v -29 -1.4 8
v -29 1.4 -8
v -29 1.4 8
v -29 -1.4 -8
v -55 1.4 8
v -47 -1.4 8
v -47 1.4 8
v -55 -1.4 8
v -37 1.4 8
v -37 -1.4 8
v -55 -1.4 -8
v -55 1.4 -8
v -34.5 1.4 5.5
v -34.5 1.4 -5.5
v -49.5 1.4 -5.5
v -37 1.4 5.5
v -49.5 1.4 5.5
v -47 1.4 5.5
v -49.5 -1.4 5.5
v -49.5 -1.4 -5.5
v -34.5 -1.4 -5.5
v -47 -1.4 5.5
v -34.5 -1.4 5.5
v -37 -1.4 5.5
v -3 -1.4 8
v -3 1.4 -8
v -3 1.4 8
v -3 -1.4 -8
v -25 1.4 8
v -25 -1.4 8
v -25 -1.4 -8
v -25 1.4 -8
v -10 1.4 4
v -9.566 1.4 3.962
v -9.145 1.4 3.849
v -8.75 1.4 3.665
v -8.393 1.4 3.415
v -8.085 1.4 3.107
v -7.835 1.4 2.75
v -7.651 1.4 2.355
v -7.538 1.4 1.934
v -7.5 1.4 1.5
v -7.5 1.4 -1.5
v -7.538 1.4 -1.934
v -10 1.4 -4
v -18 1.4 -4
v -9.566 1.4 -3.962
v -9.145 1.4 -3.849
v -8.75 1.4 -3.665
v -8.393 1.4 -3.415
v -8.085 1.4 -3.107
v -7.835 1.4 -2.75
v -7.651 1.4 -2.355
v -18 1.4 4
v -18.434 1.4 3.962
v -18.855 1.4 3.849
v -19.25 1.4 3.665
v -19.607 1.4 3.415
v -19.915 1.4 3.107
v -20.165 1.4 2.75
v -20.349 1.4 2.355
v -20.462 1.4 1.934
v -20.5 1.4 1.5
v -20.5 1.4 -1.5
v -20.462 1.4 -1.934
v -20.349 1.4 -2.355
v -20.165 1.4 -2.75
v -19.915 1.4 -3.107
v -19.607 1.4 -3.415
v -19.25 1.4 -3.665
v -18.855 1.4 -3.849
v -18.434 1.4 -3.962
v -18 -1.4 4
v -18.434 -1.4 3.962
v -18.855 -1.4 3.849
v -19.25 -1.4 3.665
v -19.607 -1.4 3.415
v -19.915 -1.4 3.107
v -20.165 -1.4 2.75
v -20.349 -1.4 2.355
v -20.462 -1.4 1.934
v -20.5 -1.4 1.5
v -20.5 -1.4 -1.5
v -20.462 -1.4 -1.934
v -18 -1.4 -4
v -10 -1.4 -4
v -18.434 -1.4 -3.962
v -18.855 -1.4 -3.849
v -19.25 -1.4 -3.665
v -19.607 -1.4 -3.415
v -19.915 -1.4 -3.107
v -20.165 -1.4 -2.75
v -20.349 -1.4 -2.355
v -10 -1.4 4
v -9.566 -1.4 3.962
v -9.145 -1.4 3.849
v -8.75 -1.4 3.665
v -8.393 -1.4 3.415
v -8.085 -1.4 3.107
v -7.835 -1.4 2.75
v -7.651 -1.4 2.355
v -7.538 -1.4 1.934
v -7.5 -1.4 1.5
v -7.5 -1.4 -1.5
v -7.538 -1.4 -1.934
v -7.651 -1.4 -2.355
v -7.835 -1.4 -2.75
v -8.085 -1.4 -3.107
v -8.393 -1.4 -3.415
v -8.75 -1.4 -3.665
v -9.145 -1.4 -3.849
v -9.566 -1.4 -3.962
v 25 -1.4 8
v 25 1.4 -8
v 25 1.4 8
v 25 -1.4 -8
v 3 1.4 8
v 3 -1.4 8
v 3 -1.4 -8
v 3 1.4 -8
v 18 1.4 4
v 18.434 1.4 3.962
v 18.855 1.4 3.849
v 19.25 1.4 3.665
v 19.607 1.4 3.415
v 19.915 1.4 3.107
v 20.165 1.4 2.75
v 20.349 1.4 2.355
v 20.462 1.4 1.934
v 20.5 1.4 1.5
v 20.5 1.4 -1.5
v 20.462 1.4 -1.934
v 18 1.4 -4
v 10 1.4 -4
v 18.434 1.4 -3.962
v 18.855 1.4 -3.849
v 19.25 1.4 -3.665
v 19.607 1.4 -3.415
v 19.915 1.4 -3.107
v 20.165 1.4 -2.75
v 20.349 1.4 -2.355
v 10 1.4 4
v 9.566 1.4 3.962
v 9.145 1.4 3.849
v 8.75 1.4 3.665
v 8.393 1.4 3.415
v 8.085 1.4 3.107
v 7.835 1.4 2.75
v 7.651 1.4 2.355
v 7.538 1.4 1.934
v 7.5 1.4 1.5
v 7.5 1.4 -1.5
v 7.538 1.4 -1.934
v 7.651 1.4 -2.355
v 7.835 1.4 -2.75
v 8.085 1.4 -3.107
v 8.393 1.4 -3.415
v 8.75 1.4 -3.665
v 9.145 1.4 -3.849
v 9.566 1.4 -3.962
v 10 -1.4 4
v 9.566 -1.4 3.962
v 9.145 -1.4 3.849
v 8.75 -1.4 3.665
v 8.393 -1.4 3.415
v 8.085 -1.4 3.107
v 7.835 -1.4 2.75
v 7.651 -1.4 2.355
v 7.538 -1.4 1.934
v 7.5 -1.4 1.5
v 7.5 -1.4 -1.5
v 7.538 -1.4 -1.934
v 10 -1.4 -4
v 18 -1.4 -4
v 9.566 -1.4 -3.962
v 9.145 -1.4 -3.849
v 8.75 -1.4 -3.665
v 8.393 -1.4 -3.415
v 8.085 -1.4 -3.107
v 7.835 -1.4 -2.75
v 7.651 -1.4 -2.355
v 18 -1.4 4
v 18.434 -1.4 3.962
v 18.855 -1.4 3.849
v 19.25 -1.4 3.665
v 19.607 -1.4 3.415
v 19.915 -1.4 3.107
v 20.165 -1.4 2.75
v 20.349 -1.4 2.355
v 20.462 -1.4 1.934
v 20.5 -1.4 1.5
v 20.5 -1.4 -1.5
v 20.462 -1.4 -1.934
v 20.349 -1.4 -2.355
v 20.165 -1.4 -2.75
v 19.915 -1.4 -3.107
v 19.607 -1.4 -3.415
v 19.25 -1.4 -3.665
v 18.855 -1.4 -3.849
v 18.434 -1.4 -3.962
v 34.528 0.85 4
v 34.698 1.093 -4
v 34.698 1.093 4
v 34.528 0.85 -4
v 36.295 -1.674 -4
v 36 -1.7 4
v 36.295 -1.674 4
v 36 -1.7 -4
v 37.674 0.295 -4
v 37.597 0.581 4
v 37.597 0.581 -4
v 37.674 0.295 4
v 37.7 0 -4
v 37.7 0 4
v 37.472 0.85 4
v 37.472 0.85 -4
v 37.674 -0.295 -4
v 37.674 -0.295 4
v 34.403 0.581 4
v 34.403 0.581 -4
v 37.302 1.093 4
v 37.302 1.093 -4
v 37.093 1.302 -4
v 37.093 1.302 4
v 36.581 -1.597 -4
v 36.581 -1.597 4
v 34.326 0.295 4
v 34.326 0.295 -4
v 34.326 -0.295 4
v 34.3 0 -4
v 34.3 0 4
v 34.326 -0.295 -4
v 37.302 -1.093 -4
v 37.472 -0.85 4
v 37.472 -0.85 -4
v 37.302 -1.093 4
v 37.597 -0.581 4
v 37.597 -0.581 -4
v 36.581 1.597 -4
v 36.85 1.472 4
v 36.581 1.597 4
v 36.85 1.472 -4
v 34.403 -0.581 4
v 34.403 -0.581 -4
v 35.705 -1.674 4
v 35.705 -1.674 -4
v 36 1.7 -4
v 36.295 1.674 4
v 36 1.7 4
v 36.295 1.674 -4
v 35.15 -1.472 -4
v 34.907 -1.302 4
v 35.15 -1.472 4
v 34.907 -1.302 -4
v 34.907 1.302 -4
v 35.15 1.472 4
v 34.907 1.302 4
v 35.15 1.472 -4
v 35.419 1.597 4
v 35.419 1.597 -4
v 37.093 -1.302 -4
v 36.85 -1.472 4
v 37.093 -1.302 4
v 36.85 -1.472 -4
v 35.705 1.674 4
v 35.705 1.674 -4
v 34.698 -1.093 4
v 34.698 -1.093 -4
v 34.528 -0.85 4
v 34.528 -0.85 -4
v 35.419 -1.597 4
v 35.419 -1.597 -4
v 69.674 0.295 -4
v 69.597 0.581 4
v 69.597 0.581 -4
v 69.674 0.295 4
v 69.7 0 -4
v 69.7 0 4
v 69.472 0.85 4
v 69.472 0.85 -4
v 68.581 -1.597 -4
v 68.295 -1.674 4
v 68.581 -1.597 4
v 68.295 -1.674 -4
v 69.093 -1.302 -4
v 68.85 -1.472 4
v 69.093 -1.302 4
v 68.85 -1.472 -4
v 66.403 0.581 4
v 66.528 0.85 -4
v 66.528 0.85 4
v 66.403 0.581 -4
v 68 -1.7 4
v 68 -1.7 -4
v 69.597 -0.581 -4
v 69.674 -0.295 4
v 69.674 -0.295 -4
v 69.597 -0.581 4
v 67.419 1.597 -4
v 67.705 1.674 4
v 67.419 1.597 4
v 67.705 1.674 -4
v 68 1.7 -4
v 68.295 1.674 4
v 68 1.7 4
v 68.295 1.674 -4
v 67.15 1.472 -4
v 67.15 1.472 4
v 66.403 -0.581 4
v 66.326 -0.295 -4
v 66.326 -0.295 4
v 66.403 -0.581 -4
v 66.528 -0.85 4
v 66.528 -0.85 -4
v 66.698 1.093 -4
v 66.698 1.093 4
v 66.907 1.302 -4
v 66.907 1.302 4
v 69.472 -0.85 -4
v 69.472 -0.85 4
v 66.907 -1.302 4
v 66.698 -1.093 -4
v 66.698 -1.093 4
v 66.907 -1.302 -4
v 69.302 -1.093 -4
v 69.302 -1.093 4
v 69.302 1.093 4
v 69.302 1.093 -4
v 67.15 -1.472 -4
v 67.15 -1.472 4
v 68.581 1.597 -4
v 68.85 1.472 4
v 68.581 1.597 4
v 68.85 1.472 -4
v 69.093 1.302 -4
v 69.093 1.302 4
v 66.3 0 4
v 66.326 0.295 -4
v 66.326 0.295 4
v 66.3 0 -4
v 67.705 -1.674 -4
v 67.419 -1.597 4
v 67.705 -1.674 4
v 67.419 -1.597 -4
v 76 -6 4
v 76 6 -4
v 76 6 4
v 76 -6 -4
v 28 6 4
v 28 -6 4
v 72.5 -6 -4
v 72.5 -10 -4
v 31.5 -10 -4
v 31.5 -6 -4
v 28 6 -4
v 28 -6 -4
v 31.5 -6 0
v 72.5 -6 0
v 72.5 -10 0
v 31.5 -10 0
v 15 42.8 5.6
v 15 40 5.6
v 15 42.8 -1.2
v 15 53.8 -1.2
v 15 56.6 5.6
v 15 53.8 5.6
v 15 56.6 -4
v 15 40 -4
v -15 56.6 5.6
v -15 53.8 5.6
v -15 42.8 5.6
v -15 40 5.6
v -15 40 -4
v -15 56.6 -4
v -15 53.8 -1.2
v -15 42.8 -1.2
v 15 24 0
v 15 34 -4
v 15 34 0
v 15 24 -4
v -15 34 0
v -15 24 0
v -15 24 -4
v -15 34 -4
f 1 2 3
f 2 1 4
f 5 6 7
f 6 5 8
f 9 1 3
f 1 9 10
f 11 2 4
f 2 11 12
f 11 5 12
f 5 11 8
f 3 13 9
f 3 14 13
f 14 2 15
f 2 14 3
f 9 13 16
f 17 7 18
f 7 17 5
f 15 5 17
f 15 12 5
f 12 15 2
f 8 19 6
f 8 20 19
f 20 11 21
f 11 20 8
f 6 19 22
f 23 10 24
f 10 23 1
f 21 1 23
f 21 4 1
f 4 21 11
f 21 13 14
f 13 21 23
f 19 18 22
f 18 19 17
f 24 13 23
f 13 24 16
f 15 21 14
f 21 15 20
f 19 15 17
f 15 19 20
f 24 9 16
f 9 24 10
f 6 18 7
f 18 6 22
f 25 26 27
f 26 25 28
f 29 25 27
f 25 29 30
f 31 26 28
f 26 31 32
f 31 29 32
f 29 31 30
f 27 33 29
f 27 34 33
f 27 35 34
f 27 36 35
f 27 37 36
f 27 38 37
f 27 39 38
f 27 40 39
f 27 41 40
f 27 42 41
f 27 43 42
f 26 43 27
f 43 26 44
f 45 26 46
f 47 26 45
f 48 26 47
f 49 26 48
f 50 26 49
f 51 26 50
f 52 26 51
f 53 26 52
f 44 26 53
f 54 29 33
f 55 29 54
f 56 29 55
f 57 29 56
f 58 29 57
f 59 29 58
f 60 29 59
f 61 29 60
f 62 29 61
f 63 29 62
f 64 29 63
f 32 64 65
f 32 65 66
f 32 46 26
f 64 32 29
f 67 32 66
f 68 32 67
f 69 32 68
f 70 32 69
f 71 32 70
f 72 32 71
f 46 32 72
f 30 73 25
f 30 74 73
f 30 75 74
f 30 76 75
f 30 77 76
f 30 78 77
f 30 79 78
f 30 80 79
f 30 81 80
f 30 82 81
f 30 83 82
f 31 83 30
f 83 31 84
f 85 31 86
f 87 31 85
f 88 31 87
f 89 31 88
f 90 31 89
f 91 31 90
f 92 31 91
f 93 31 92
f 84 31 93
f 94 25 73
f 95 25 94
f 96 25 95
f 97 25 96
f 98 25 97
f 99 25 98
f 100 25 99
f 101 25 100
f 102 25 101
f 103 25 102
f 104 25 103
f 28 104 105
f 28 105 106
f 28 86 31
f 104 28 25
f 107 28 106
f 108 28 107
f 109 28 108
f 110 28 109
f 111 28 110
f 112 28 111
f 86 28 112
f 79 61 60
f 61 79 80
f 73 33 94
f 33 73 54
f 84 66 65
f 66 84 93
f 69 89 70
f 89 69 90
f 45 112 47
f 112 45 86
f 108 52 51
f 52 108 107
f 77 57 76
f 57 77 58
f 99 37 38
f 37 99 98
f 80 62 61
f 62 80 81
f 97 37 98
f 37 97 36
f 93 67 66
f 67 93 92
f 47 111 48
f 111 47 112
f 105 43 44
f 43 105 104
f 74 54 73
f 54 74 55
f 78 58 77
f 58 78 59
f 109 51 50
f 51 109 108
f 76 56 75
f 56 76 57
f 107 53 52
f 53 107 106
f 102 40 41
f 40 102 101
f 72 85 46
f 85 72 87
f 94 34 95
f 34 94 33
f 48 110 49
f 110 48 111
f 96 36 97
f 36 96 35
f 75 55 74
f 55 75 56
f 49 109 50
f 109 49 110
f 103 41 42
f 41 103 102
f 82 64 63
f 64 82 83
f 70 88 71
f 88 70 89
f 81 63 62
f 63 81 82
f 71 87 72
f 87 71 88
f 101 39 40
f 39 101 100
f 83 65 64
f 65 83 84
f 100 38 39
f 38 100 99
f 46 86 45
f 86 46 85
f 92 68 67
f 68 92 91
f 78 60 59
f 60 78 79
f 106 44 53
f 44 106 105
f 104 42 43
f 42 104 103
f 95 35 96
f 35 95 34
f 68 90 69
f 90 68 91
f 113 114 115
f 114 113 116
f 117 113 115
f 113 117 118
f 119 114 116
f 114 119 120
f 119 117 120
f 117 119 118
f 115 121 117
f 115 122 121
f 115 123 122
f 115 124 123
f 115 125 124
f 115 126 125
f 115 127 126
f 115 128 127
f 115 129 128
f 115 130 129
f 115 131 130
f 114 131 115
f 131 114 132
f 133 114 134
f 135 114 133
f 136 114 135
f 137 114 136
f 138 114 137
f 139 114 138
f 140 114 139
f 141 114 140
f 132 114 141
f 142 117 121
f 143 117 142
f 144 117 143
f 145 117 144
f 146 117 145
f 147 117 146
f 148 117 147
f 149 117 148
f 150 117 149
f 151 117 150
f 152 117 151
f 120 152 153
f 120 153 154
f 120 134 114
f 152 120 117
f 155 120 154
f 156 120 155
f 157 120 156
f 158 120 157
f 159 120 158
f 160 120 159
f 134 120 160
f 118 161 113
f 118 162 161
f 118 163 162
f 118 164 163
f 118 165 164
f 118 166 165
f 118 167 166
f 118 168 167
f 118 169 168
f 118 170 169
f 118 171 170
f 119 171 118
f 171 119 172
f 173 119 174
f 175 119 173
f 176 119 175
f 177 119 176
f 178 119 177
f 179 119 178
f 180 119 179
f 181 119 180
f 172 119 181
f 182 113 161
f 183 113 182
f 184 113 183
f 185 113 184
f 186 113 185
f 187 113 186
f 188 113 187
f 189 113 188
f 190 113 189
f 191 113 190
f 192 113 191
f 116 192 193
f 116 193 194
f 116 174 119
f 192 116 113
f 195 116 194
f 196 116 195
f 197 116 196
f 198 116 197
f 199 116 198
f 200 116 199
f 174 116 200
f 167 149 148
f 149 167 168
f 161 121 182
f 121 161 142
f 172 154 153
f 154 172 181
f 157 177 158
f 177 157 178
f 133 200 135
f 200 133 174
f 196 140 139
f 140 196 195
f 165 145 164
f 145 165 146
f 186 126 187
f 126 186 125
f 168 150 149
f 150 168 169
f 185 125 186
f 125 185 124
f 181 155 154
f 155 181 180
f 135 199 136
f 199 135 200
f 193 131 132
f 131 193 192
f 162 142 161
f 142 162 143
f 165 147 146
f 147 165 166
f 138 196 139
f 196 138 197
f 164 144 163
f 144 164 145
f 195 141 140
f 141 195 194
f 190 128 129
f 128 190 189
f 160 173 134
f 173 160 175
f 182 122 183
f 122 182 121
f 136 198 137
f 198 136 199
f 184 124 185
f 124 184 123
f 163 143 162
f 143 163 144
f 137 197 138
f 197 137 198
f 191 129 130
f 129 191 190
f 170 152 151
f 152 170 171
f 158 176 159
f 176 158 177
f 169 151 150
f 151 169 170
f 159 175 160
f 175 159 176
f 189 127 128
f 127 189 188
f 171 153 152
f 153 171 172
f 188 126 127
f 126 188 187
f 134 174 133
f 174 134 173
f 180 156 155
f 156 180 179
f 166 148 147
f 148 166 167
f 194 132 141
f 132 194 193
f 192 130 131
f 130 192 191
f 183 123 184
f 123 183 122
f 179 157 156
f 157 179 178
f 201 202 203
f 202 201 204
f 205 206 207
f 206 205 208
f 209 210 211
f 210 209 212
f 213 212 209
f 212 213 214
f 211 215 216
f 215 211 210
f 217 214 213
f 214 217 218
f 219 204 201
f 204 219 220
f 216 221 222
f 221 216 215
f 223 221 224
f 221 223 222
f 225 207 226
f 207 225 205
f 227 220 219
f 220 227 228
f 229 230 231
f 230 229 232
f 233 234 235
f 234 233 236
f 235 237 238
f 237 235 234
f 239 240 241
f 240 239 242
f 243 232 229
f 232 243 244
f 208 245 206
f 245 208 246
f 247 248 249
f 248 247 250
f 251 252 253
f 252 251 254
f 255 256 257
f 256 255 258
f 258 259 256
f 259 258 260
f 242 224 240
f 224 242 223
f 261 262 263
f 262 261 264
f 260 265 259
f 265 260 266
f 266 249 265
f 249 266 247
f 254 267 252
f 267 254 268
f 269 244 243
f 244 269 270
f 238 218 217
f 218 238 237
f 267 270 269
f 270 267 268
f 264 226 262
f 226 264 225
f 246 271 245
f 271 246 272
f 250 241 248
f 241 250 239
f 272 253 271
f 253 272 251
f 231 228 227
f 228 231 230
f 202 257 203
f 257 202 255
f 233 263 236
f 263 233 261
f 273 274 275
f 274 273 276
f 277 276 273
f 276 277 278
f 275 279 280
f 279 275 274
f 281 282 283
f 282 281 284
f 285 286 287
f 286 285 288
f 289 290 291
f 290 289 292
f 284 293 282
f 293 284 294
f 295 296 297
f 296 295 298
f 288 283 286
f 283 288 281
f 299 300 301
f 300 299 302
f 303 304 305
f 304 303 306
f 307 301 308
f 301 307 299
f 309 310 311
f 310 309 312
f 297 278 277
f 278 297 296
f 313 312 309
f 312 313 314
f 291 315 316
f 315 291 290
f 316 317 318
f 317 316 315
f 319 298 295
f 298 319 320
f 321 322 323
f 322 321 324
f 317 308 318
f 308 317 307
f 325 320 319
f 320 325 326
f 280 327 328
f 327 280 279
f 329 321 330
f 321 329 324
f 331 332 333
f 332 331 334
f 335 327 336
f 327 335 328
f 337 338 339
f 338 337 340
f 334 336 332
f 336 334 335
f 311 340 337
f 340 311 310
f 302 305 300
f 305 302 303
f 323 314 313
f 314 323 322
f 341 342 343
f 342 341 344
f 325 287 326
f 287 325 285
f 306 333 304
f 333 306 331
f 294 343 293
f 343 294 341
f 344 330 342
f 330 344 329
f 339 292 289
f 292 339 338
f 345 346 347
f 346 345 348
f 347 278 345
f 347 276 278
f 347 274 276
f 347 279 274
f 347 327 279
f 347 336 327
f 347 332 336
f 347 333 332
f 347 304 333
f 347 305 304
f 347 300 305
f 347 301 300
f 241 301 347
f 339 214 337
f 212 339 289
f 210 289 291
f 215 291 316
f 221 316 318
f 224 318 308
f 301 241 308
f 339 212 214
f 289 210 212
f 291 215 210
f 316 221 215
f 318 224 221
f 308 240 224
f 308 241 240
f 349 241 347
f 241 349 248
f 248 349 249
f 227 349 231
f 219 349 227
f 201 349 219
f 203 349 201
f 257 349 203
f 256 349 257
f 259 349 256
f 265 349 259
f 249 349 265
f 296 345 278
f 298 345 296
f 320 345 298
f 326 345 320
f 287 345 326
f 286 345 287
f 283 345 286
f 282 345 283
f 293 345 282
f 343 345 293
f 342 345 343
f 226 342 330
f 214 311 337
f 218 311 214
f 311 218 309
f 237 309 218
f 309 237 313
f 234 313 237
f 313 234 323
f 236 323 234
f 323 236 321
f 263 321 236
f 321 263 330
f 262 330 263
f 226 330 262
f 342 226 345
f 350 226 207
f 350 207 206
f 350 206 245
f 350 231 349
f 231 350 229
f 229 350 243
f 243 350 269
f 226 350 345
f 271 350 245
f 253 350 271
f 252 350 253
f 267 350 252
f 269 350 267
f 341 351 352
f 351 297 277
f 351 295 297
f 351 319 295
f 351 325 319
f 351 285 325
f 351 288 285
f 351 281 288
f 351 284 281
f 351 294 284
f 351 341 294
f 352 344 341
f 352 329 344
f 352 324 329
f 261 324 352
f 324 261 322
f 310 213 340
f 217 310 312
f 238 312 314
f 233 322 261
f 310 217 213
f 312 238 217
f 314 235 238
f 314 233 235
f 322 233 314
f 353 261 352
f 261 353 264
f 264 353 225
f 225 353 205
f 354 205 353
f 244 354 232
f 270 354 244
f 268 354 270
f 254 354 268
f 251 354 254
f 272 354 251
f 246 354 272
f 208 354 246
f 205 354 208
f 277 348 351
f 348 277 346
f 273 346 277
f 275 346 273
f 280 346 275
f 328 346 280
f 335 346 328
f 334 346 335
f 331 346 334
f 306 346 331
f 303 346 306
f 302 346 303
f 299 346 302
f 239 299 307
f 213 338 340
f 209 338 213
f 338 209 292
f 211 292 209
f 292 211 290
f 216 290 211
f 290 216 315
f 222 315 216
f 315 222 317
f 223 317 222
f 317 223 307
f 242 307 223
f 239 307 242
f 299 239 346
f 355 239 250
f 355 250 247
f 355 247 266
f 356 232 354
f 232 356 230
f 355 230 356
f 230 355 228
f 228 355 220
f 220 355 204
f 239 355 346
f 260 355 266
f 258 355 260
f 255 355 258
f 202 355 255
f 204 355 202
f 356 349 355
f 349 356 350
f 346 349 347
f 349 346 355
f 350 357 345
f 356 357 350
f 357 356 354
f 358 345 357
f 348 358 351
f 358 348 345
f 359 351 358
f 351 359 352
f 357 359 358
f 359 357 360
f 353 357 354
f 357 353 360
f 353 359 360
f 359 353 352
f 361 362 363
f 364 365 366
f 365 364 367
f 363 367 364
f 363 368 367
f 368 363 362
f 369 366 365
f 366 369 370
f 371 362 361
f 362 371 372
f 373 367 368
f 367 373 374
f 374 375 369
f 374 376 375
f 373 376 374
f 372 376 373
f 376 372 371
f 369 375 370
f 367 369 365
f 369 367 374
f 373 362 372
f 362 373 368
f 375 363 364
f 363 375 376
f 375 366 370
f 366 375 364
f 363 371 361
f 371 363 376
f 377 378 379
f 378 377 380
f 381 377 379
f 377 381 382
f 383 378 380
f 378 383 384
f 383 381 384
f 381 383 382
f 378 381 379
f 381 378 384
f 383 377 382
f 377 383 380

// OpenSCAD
// UNG-DRACO hardware fit coupon — Rev C
// PRINT THIS BEFORE ANOTHER FULL ENCLOSURE.
// Replace the placeholder plug/fan dimensions below with physical measurements
// recorded in BUILD_HANDOFF.md. Do not release the full base until this coupon passes.
$fn=36;
wall=2.8;
clearance=0.50;

// ACTUAL-PLUG ENVELOPE PARAMETERS (placeholders until measured)
rj45_plug_w=14.0; rj45_plug_h=10.0;      // includes insertion body; enlarge for boot as measured
usb_data_w=12.0; usb_data_h=7.0;          // plug body/strain-relief envelope
usb_power_w=12.0; usb_power_h=7.0;
fan_screw_pitch=32.0;                     // placeholder; measure actual fan
fan_screw_d=3.4;
fan_frame=40.0;
coupon_h=16;

module rounded_rect_cutout(w,h,d,r=2){
    hull() for(x=[-w/2+r,w/2-r]) for(z=[-h/2+r,h/2-r])
        translate([x,0,z]) rotate([90,0,0]) cylinder(r=r,h=d,center=true);
}

module port_block(label_w=24){
    cube([label_w,wall,coupon_h],center=true);
}

module rj45_test(){
    difference(){
        port_block(26);
        translate([0,0,0]) cube([rj45_plug_w+2*clearance,wall+4,rj45_plug_h+2*clearance],center=true);
        // latch/finger relief above plug
        translate([0,0,(rj45_plug_h+2*clearance)/2+2.5])
            cube([10,wall+4,5],center=true);
    }
}

module usb_test(w,h){
    difference(){
        port_block(22);
        rounded_rect_cutout(w+2*clearance,h+2*clearance,wall+4,min((h+2*clearance)/2,2.5));
    }
}

module fan_corner_test(){
    // Two-hole representative fan rail verifies frame edge + screw pitch.
    difference(){
        cube([fan_frame+8,12,8],center=true);
        for(x=[-fan_screw_pitch/2,fan_screw_pitch/2])
            translate([x,0,0]) cylinder(d=fan_screw_d,h=12,center=true);
    }
    // Pocket datum lip: actual fan frame must sit flat against this edge.
    translate([0,-8,-2]) cube([fan_frame+2*clearance,4,4],center=true);
}

module interlock_test(){
    rail_w=10; rail_h=4; len=30;
    cube([len,rail_w,rail_h]);
    translate([0,rail_w+6,0])
    difference(){
        cube([len,rail_w+2*wall+2*clearance,rail_h+2*wall]);
        translate([0,wall,wall]) cube([len+1,rail_w+2*clearance,rail_h+wall]);
    }
}

// Four required validations on one small print.
translate([-42,0,0]) rj45_test();
translate([-14,0,0]) usb_test(usb_data_w,usb_data_h);
translate([14,0,0]) usb_test(usb_power_w,usb_power_h);
translate([52,0,0]) fan_corner_test();
translate([-15,24,-4]) interlock_test();
